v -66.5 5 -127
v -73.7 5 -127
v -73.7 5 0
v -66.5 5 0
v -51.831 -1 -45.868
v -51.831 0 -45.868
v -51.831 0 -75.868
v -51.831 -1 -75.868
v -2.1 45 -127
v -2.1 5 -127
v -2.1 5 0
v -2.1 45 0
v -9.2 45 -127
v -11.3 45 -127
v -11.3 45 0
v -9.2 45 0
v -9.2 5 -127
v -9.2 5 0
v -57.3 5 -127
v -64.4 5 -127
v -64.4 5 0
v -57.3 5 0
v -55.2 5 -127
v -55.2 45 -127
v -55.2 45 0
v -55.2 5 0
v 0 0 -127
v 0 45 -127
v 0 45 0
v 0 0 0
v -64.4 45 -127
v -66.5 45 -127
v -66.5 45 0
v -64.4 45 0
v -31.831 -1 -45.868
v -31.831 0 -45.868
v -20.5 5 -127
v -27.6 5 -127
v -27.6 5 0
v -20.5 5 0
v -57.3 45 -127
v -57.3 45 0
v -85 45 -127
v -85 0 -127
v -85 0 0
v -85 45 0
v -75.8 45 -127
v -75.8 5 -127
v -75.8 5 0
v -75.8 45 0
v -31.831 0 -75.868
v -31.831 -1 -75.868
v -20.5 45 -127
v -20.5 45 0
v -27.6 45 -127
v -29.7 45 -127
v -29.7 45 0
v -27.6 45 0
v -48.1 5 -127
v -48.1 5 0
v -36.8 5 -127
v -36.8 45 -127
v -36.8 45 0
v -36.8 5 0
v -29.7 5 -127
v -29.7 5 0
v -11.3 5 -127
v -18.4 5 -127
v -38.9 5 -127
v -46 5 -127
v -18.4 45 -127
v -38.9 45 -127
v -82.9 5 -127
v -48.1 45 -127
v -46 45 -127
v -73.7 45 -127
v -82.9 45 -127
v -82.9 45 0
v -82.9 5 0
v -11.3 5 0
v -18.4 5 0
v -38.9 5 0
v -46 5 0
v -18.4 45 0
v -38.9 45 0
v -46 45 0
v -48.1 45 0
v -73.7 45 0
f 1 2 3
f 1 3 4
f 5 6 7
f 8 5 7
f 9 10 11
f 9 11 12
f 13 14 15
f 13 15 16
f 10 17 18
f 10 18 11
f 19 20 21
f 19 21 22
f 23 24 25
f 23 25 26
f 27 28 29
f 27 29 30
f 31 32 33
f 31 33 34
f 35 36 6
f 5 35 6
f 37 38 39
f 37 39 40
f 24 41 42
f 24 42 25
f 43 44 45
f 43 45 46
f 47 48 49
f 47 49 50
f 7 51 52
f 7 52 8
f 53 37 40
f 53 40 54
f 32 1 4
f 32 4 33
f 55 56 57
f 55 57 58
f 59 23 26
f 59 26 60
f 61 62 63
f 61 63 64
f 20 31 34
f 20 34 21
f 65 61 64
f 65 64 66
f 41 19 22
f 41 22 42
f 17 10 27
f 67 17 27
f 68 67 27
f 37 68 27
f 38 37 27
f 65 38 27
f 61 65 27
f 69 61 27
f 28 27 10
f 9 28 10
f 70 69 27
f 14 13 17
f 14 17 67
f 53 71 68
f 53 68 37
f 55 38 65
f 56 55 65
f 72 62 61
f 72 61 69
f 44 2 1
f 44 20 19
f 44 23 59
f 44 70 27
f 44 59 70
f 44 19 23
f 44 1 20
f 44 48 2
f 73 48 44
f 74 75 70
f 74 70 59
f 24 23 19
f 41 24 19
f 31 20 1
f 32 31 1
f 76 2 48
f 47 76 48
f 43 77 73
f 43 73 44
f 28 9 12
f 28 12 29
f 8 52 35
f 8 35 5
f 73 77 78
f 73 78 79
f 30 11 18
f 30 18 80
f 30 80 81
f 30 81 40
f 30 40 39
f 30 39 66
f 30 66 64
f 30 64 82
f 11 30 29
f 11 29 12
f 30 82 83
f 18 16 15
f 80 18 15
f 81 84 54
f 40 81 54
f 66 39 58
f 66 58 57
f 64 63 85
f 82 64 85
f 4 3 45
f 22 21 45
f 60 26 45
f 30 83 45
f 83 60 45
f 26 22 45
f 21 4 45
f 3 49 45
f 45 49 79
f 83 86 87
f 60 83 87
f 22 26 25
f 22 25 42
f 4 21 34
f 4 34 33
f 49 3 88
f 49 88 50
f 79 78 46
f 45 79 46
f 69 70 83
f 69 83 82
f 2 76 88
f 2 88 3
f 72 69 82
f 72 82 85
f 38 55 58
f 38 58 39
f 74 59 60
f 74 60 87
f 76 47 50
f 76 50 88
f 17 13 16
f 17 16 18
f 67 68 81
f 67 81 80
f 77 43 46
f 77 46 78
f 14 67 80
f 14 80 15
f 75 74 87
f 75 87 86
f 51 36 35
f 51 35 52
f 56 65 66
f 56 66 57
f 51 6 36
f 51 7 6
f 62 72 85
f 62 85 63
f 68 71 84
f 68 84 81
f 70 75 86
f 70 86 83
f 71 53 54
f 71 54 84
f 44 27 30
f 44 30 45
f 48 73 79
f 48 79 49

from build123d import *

# Parameters (mm, degrees)
BOSS_EXTRUDE1_DEPTH = 127
SKETCH5_W           = 20
SKETCH5_H           = 30
BOSS_EXTRUDE4_DEPTH = 1


# Read off the part's stored shape, not the designer's step: Split2
with BuildPart() as part:
    # Sketch1 → Boss-Extrude1 (new body)
    with BuildSketch(Plane(origin=(0, 0, -127), x_dir=(-1, 0, 0), z_dir=(0, 0, -1))):
        Polygon((85, 45), (82.9, 45), (82.9, 5), (75.8, 5), (75.8, 45), (73.7, 45), (73.7, 5), (66.5, 5), (66.5, 45), (64.4, 45), (64.4, 5), (57.3, 5), (57.3, 45), (55.2, 45), (55.2, 5), (48.1, 5), (48.1, 45), (46, 45), (46, 5), (38.9, 5), (38.9, 45), (36.8, 45), (36.8, 5), (29.7, 5), (29.7, 45), (27.6, 45), (27.6, 5), (20.5, 5), (20.5, 45), (18.4, 45), (18.4, 5), (11.3, 5), (11.3, 45), (9.2, 45), (9.2, 5), (2.1, 5), (2.1, 45), (0, 45), (0, 0), (85, 0), align=None)
    extrude(amount=-BOSS_EXTRUDE1_DEPTH)

    # Sketch5 → Boss-Extrude4 (add)
    with BuildSketch(Plane(origin=(0, 0, 0), x_dir=(-1, 0, 0), z_dir=(0, -1, 0))):
        with Locations((41.830664792, 60.868181684)):
            Rectangle(SKETCH5_W, SKETCH5_H)
    extrude(amount=BOSS_EXTRUDE4_DEPTH)


with BuildPart() as body_2:
    # Split2: the piece on the far side of the plane
    add(part.part)
    split(bisect_by=Plane(origin=(0, 0, 0), x_dir=(1, 0, 0), z_dir=(0, 1, 0)), keep=Keep.BOTTOM)


with BuildPart() as part_1:
    add(part.part)

    # Split2
    split(bisect_by=Plane(origin=(0, 0, 0), x_dir=(1, 0, 0), z_dir=(0, 1, 0)), keep=Keep.TOP)


solid = Compound([body_2.part, part_1.part])
